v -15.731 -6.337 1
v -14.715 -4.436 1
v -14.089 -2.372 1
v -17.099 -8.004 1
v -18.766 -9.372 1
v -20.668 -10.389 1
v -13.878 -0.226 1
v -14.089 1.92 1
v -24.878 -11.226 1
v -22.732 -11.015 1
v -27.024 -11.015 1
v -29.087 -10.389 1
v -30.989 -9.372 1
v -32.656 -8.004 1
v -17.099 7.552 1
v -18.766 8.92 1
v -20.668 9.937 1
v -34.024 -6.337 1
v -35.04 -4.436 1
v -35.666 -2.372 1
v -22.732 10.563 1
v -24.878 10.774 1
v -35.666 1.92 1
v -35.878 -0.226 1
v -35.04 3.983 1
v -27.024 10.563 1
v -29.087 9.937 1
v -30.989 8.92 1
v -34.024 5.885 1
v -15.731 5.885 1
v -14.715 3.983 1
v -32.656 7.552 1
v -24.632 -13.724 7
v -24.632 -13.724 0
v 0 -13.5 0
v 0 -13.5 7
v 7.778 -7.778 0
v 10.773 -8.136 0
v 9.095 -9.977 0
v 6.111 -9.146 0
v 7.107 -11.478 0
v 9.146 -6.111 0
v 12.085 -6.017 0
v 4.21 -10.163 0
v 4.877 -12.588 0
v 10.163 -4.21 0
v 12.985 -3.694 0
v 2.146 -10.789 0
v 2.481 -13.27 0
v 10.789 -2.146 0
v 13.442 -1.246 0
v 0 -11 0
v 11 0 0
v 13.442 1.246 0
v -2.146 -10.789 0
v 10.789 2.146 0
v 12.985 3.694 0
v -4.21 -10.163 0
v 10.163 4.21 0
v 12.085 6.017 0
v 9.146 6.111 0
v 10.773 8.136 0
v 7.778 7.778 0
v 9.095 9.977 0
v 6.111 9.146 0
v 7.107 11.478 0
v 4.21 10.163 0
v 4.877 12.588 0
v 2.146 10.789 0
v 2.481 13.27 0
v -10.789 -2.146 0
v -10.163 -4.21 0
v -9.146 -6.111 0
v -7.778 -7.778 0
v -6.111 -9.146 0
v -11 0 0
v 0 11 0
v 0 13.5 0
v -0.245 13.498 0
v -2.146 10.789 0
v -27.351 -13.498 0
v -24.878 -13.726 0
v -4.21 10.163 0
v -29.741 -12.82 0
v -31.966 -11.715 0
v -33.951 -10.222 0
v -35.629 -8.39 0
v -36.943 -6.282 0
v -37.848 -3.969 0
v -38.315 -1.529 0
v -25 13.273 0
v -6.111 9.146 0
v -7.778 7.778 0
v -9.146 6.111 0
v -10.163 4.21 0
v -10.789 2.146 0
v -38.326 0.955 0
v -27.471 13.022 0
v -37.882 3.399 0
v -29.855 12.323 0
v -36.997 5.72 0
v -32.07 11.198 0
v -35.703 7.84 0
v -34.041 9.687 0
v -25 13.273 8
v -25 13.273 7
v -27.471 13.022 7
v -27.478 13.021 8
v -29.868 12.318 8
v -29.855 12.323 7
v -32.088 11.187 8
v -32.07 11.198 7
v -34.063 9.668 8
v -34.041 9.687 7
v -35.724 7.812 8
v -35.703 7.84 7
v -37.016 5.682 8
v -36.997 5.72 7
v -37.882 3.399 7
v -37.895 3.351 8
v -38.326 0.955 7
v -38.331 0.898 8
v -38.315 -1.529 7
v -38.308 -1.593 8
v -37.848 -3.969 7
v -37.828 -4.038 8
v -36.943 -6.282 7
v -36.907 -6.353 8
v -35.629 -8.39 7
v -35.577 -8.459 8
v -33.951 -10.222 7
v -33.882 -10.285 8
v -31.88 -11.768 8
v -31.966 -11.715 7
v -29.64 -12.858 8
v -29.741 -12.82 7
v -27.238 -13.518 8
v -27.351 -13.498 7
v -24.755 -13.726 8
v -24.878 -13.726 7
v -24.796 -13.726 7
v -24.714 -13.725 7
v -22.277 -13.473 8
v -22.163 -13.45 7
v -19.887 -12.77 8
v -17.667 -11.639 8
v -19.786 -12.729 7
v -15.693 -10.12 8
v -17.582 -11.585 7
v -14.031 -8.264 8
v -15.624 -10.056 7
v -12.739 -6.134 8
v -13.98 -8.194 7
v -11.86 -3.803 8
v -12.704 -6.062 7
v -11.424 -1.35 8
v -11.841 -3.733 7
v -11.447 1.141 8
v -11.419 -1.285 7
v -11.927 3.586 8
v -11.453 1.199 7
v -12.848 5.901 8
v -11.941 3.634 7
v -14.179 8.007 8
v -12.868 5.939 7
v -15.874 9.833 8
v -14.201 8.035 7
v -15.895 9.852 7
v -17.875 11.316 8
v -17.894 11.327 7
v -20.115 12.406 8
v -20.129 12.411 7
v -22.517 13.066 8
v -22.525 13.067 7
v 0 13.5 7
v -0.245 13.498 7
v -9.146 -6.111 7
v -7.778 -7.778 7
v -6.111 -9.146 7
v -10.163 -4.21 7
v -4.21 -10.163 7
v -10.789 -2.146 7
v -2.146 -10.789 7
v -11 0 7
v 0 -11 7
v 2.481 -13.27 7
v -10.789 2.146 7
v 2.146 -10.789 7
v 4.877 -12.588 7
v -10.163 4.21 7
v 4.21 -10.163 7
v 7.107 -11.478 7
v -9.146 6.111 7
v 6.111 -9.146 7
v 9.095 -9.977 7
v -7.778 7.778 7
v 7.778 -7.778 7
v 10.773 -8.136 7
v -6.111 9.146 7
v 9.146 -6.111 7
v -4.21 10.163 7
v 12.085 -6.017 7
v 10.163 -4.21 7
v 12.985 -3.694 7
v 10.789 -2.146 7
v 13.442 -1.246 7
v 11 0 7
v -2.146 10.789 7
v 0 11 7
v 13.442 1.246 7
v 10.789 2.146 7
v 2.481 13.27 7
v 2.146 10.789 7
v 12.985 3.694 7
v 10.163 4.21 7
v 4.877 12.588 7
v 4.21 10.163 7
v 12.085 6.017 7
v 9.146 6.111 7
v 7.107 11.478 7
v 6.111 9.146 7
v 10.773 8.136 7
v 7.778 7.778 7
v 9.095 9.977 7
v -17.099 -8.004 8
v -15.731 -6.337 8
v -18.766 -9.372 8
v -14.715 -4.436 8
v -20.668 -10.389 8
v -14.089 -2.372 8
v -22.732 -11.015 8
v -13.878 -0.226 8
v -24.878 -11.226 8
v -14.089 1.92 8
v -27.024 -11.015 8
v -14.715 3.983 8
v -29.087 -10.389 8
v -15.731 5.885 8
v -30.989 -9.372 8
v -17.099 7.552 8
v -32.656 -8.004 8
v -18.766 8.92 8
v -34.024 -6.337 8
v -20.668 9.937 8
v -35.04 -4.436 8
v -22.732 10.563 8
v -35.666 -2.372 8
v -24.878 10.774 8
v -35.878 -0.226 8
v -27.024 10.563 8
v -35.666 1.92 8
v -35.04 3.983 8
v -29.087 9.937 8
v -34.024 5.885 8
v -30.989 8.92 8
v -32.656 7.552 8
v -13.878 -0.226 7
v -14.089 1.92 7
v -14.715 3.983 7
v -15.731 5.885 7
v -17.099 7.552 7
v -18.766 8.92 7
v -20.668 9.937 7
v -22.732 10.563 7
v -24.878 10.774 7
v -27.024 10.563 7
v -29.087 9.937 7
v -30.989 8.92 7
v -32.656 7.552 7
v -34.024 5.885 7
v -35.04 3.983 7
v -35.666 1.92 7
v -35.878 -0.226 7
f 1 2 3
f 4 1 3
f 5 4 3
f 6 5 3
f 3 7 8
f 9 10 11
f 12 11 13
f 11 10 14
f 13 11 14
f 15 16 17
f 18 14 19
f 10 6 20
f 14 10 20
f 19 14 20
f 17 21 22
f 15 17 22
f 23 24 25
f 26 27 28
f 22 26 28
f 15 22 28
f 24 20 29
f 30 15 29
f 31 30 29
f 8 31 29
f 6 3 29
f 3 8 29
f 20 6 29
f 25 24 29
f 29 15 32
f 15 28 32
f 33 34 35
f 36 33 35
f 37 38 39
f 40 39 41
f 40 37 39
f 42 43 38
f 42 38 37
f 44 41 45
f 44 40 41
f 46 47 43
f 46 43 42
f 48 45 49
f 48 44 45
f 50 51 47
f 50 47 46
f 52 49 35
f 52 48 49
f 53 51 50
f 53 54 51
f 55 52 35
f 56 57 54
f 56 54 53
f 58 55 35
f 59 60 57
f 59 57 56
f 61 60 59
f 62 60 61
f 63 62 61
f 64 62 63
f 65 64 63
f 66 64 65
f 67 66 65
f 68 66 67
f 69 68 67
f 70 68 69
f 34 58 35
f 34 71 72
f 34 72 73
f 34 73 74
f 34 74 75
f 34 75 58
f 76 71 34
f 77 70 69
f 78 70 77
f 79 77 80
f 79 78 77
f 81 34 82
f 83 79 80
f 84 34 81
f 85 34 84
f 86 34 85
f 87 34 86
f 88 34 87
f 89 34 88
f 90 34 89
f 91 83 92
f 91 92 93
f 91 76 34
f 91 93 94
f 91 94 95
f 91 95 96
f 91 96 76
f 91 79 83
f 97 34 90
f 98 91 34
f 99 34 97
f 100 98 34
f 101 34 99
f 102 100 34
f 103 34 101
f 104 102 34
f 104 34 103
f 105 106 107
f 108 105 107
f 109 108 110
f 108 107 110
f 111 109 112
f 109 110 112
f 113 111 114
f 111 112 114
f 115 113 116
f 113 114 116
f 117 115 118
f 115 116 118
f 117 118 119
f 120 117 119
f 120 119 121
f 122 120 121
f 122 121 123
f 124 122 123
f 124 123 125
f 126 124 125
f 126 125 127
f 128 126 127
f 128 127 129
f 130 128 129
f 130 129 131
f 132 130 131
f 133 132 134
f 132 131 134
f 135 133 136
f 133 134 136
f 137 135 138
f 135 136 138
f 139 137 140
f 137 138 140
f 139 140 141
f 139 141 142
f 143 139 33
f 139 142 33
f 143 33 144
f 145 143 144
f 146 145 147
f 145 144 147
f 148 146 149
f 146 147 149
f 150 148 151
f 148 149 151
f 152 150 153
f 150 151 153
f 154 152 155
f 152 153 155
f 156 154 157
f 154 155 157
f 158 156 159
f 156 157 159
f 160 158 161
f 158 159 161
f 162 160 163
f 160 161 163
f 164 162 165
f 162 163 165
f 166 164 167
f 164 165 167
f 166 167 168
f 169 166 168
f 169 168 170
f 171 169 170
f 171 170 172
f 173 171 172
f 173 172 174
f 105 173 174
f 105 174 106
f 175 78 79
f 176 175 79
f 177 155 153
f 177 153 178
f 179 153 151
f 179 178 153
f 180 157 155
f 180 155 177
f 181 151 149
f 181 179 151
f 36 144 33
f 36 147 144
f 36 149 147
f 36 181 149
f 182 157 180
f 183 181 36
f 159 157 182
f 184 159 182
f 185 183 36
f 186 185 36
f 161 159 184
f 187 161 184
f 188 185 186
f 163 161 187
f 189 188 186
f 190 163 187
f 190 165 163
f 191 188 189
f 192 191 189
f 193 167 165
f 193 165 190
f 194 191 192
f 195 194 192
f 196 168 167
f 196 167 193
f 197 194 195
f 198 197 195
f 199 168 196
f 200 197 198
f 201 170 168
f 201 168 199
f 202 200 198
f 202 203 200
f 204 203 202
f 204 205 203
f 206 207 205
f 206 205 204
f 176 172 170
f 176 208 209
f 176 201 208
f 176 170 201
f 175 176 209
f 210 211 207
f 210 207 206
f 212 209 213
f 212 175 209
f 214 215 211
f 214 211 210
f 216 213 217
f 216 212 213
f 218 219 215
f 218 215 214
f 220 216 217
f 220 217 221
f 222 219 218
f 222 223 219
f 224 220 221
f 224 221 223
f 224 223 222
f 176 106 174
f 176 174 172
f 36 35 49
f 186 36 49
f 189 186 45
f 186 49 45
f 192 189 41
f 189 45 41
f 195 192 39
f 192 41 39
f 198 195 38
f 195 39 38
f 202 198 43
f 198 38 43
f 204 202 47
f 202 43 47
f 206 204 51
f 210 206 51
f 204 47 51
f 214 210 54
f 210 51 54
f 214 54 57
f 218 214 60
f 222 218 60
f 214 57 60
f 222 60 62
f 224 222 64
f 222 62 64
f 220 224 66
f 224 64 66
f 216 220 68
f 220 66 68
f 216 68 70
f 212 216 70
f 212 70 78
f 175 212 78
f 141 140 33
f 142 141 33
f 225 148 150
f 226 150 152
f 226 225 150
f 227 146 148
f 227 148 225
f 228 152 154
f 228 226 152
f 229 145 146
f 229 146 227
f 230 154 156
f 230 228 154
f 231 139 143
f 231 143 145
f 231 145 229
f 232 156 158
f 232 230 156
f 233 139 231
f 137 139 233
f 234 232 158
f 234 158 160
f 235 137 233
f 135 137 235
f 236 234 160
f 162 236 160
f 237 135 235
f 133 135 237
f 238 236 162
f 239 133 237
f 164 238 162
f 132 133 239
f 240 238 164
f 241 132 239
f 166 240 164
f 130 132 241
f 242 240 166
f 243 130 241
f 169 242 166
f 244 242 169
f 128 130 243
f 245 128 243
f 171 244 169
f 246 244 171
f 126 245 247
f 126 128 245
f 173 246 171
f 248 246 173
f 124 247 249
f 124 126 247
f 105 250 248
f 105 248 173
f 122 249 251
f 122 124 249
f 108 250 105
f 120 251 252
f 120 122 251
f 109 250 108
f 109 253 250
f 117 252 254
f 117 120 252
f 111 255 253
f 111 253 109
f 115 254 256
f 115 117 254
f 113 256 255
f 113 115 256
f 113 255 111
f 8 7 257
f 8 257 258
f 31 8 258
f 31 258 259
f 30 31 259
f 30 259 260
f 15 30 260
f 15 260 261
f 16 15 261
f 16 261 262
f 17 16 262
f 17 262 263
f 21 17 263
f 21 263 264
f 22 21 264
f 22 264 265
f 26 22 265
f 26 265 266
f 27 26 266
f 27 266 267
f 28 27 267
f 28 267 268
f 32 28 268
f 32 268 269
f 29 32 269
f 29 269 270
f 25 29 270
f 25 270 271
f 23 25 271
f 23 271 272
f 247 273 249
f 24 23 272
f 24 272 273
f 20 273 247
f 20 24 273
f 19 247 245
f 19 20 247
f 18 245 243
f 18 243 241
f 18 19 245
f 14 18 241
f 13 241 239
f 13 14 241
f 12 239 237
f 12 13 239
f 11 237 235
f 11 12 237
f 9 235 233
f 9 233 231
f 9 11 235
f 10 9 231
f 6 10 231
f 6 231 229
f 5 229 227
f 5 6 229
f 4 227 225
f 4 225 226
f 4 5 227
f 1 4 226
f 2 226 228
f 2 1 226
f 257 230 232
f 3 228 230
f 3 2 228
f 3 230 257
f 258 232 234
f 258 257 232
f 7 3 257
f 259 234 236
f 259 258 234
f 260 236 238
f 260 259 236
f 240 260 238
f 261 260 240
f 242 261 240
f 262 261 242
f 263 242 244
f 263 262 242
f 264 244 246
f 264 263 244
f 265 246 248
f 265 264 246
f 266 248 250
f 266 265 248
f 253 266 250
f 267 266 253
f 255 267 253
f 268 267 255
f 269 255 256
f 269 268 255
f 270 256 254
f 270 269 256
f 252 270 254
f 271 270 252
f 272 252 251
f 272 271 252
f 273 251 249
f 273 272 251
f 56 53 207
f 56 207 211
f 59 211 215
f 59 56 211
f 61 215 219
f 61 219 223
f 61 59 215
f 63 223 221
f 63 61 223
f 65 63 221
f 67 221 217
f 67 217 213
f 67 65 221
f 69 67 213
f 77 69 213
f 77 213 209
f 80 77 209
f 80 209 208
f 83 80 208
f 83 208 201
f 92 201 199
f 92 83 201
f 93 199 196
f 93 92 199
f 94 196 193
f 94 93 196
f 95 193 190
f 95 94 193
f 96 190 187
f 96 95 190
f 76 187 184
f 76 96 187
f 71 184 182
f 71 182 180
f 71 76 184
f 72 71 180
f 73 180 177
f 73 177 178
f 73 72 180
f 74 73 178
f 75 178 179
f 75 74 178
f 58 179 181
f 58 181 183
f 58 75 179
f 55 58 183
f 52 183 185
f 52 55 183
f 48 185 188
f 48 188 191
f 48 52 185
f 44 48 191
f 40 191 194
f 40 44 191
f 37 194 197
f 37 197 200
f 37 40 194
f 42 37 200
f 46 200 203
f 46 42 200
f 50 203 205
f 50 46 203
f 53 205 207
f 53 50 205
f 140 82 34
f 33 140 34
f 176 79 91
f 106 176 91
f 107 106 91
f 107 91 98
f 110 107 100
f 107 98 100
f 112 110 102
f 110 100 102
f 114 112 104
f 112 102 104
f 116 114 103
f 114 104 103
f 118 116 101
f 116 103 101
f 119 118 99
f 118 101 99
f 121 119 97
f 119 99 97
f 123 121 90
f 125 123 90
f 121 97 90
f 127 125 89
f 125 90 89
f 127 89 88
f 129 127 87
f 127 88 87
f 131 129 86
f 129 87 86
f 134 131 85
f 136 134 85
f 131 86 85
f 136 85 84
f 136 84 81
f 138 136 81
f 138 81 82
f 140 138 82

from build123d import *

# Parameters (mm, degrees)
SKETCH1_R           = 11
BOSS_EXTRUDE1_DEPTH = 7
SKETCH2_R           = 11
BOSS_EXTRUDE2_DEPTH = 1
SKETCH3_R           = 13.5
SKETCH3_R_2         = 11
BOSS_EXTRUDE3_DEPTH = 1


with BuildPart() as part:
    # Sketch1 → Boss-Extrude1 (new body)
    with BuildSketch(Plane.XY):
        with BuildLine():
            ThreePointArc((0, -13.5), (13.5, 0), (0, 13.5))
            Line((0, 13.5), (-0.244738618, 13.497781411))
            Line((-0.244738618, 13.497781411), (-25, 13.273371546))
            ThreePointArc((-25, 13.273371546), (-38.377486998, -0.287261592), (-24.877625663, -13.726073795))
            Line((-24.877625663, -13.726073795), (-24.632285191, -13.723844279))
            Line((-24.632285191, -13.723844279), (0, -13.5))
        make_face()
        with Locations((-24.877625663, -0.226073795)):
            Circle(SKETCH1_R, mode=Mode.SUBTRACT)
        Circle(SKETCH1_R, mode=Mode.SUBTRACT)
    extrude(amount=BOSS_EXTRUDE1_DEPTH)

    # Sketch2 → Boss-Extrude2 (add)
    with BuildSketch(Plane(origin=(0, 0, 0), x_dir=(-1, 0, 0), z_dir=(0, 0, -1))):
        with Locations((24.877625663, -0.226073795)):
            Circle(SKETCH2_R)
    extrude(amount=-BOSS_EXTRUDE2_DEPTH)

    # Sketch3 → Boss-Extrude3 (add)
    with BuildSketch(Plane.XY.offset(7)):
        with Locations(Location((-24.877625663, -0.226073795, 0), (0, 0, 90.519379929))):
            Circle(SKETCH3_R)
        with Locations(Location((-24.877625663, -0.226073795, 0), (0, 0, 180))):
            Circle(SKETCH3_R_2, mode=Mode.SUBTRACT)
    extrude(amount=BOSS_EXTRUDE3_DEPTH)


solid = part.part
